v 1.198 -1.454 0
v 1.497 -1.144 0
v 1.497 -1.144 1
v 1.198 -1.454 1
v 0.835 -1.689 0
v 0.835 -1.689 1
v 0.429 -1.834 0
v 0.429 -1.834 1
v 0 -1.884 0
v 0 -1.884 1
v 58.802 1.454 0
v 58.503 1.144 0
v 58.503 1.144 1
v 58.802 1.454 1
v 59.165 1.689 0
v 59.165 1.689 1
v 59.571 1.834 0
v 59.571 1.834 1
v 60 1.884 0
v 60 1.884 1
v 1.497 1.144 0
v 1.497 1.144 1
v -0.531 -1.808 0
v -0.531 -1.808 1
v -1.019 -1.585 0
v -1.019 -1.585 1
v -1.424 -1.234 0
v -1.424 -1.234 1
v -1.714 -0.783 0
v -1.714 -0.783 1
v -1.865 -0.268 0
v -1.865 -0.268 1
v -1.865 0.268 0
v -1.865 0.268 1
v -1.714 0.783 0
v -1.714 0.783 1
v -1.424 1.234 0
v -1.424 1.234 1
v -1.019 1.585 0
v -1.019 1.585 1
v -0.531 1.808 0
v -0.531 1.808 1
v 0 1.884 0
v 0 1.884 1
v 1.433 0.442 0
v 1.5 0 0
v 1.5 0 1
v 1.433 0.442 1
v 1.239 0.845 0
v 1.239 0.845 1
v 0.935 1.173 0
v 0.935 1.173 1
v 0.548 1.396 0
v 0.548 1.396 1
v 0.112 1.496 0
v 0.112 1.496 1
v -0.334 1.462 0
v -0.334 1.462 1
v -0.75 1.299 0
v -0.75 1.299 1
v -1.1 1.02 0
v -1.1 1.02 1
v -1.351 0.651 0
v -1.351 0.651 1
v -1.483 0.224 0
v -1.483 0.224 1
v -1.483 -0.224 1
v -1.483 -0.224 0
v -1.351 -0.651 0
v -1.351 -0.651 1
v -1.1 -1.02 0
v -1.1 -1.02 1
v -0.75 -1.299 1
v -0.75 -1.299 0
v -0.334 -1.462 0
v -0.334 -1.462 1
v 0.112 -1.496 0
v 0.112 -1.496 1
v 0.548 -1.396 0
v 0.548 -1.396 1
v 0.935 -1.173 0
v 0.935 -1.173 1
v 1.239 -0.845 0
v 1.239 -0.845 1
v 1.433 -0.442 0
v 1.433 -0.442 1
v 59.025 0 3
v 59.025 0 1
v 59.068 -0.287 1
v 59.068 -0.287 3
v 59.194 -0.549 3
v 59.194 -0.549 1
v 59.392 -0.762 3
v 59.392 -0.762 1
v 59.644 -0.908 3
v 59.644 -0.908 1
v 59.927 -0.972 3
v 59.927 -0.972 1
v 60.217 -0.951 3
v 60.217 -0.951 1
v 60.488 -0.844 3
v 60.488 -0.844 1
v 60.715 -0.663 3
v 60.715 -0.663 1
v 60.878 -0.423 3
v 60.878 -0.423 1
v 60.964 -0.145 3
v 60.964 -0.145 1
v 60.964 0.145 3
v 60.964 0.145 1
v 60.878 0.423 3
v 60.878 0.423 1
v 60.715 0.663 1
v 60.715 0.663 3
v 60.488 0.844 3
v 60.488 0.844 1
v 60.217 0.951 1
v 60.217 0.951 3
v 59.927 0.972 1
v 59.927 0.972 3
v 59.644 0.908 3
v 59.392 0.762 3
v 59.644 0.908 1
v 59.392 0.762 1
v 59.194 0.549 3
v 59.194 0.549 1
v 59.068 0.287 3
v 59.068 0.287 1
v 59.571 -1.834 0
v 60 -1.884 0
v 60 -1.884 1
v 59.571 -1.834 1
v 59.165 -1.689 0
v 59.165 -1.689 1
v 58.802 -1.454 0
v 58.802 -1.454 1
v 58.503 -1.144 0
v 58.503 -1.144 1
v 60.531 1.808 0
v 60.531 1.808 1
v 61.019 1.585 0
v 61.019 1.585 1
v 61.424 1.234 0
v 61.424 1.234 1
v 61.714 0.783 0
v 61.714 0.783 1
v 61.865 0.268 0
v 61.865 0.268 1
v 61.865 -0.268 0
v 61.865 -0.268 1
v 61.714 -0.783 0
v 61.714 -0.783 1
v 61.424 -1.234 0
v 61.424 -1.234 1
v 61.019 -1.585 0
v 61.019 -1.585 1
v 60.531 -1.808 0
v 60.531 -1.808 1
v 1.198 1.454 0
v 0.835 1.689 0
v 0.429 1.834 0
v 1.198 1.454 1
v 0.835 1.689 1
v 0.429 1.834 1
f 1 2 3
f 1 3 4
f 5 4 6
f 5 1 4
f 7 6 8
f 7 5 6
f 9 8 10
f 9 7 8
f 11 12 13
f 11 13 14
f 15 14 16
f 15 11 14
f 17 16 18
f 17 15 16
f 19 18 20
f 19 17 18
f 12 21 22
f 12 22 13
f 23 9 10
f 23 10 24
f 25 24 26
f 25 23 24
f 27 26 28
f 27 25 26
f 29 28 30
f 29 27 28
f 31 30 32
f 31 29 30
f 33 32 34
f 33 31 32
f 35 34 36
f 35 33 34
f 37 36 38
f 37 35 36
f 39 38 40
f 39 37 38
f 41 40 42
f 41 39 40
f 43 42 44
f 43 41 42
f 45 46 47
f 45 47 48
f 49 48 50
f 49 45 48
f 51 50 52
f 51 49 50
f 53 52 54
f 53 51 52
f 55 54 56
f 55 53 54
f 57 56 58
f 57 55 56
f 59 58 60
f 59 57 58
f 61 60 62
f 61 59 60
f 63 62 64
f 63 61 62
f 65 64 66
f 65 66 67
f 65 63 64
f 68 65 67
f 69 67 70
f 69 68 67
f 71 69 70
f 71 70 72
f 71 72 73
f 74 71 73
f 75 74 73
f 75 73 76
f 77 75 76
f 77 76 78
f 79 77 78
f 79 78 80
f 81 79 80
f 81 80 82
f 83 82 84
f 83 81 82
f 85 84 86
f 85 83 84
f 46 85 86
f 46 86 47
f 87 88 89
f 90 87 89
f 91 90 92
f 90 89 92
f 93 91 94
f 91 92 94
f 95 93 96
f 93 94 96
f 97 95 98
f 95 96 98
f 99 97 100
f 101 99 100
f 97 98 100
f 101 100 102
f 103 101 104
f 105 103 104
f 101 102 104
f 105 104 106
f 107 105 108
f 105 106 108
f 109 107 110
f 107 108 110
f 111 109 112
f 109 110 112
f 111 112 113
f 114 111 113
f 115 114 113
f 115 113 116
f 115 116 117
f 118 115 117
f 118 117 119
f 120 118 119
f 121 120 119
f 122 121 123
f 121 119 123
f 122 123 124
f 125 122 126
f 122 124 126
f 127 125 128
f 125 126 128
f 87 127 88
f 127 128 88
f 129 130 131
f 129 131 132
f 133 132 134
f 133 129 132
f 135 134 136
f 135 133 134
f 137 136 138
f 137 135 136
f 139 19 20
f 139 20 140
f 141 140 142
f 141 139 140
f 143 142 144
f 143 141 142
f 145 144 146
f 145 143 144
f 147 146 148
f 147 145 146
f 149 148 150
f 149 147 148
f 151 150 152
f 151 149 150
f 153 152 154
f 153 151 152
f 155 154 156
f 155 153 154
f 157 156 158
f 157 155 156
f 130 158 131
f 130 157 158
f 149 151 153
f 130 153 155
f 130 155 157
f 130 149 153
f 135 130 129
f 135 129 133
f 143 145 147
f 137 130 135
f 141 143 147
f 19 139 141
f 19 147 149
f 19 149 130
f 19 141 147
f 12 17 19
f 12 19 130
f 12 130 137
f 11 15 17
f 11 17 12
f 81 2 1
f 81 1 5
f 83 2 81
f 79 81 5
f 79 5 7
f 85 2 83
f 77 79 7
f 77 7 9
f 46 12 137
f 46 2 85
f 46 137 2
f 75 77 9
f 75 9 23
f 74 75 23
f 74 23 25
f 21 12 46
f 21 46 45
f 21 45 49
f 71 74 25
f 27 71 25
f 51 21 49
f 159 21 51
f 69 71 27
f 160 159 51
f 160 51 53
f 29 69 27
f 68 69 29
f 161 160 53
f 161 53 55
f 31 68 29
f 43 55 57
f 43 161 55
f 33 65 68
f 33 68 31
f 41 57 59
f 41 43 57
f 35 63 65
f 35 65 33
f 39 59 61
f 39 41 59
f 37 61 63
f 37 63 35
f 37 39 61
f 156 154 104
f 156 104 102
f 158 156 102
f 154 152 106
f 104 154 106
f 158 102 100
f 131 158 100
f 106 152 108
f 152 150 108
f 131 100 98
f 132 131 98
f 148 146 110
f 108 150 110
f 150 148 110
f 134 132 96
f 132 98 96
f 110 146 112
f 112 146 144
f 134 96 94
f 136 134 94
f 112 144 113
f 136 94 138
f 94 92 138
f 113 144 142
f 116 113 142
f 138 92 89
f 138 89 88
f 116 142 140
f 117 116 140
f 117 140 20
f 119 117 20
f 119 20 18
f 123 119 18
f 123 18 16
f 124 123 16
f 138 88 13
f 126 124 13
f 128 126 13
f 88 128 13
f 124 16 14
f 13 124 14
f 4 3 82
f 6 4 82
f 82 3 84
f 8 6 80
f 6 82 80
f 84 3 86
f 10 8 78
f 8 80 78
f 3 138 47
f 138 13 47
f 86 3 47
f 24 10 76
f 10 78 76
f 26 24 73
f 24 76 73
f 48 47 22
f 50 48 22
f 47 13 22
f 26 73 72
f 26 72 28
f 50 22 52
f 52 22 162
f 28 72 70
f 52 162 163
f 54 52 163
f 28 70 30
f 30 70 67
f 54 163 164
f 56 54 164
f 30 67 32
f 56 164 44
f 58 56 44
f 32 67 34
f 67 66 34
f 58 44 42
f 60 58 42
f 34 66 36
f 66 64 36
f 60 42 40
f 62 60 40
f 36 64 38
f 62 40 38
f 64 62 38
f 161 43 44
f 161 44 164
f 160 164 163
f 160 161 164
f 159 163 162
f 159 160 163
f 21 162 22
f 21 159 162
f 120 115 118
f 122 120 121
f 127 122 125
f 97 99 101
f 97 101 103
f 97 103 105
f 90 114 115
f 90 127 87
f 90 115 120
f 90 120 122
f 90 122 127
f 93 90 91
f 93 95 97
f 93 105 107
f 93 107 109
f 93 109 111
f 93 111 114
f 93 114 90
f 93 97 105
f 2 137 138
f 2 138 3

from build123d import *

# Parameters (mm, degrees)
SKETCH1_R           = 1.5
BOSS_EXTRUDE1_DEPTH = 1
SKETCH38_R          = 0.975
BOSS_EXTRUDE2_DEPTH = 2


with BuildPart() as part:
    # Sketch1 → Boss-Extrude1 (new body)
    with BuildSketch(Plane.XY):
        with BuildLine():
            Line((1.497200651, 1.14350772), (58.502799349, 1.14350772))
            ThreePointArc((58.502799349, 1.14350772), (59.164858436, 1.688714974), (60, 1.883937285))
            ThreePointArc((60, 1.883937285), (61.883937285, 0), (60, -1.883937285))
            ThreePointArc((60, -1.883937285), (59.164858436, -1.688714974), (58.502799349, -1.14350772))
            Line((58.502799349, -1.14350772), (1.497200651, -1.14350772))
            ThreePointArc((1.497200651, -1.14350772), (0.835141564, -1.688714974), (0, -1.883937285))
            ThreePointArc((0, -1.883937285), (-1.883937285, 0), (0, 1.883937285))
            ThreePointArc((0, 1.883937285), (0.835141564, 1.688714974), (1.497200651, 1.14350772))
        make_face()
        Circle(SKETCH1_R, mode=Mode.SUBTRACT)
    extrude(amount=BOSS_EXTRUDE1_DEPTH)

    # Sketch38 → Boss-Extrude2 (add)
    with BuildSketch(Plane.XY.offset(1)):
        with Locations(Location((60, 0, 0), (0, 0, 180))):
            Circle(SKETCH38_R)
    extrude(amount=BOSS_EXTRUDE2_DEPTH)


solid = part.part
